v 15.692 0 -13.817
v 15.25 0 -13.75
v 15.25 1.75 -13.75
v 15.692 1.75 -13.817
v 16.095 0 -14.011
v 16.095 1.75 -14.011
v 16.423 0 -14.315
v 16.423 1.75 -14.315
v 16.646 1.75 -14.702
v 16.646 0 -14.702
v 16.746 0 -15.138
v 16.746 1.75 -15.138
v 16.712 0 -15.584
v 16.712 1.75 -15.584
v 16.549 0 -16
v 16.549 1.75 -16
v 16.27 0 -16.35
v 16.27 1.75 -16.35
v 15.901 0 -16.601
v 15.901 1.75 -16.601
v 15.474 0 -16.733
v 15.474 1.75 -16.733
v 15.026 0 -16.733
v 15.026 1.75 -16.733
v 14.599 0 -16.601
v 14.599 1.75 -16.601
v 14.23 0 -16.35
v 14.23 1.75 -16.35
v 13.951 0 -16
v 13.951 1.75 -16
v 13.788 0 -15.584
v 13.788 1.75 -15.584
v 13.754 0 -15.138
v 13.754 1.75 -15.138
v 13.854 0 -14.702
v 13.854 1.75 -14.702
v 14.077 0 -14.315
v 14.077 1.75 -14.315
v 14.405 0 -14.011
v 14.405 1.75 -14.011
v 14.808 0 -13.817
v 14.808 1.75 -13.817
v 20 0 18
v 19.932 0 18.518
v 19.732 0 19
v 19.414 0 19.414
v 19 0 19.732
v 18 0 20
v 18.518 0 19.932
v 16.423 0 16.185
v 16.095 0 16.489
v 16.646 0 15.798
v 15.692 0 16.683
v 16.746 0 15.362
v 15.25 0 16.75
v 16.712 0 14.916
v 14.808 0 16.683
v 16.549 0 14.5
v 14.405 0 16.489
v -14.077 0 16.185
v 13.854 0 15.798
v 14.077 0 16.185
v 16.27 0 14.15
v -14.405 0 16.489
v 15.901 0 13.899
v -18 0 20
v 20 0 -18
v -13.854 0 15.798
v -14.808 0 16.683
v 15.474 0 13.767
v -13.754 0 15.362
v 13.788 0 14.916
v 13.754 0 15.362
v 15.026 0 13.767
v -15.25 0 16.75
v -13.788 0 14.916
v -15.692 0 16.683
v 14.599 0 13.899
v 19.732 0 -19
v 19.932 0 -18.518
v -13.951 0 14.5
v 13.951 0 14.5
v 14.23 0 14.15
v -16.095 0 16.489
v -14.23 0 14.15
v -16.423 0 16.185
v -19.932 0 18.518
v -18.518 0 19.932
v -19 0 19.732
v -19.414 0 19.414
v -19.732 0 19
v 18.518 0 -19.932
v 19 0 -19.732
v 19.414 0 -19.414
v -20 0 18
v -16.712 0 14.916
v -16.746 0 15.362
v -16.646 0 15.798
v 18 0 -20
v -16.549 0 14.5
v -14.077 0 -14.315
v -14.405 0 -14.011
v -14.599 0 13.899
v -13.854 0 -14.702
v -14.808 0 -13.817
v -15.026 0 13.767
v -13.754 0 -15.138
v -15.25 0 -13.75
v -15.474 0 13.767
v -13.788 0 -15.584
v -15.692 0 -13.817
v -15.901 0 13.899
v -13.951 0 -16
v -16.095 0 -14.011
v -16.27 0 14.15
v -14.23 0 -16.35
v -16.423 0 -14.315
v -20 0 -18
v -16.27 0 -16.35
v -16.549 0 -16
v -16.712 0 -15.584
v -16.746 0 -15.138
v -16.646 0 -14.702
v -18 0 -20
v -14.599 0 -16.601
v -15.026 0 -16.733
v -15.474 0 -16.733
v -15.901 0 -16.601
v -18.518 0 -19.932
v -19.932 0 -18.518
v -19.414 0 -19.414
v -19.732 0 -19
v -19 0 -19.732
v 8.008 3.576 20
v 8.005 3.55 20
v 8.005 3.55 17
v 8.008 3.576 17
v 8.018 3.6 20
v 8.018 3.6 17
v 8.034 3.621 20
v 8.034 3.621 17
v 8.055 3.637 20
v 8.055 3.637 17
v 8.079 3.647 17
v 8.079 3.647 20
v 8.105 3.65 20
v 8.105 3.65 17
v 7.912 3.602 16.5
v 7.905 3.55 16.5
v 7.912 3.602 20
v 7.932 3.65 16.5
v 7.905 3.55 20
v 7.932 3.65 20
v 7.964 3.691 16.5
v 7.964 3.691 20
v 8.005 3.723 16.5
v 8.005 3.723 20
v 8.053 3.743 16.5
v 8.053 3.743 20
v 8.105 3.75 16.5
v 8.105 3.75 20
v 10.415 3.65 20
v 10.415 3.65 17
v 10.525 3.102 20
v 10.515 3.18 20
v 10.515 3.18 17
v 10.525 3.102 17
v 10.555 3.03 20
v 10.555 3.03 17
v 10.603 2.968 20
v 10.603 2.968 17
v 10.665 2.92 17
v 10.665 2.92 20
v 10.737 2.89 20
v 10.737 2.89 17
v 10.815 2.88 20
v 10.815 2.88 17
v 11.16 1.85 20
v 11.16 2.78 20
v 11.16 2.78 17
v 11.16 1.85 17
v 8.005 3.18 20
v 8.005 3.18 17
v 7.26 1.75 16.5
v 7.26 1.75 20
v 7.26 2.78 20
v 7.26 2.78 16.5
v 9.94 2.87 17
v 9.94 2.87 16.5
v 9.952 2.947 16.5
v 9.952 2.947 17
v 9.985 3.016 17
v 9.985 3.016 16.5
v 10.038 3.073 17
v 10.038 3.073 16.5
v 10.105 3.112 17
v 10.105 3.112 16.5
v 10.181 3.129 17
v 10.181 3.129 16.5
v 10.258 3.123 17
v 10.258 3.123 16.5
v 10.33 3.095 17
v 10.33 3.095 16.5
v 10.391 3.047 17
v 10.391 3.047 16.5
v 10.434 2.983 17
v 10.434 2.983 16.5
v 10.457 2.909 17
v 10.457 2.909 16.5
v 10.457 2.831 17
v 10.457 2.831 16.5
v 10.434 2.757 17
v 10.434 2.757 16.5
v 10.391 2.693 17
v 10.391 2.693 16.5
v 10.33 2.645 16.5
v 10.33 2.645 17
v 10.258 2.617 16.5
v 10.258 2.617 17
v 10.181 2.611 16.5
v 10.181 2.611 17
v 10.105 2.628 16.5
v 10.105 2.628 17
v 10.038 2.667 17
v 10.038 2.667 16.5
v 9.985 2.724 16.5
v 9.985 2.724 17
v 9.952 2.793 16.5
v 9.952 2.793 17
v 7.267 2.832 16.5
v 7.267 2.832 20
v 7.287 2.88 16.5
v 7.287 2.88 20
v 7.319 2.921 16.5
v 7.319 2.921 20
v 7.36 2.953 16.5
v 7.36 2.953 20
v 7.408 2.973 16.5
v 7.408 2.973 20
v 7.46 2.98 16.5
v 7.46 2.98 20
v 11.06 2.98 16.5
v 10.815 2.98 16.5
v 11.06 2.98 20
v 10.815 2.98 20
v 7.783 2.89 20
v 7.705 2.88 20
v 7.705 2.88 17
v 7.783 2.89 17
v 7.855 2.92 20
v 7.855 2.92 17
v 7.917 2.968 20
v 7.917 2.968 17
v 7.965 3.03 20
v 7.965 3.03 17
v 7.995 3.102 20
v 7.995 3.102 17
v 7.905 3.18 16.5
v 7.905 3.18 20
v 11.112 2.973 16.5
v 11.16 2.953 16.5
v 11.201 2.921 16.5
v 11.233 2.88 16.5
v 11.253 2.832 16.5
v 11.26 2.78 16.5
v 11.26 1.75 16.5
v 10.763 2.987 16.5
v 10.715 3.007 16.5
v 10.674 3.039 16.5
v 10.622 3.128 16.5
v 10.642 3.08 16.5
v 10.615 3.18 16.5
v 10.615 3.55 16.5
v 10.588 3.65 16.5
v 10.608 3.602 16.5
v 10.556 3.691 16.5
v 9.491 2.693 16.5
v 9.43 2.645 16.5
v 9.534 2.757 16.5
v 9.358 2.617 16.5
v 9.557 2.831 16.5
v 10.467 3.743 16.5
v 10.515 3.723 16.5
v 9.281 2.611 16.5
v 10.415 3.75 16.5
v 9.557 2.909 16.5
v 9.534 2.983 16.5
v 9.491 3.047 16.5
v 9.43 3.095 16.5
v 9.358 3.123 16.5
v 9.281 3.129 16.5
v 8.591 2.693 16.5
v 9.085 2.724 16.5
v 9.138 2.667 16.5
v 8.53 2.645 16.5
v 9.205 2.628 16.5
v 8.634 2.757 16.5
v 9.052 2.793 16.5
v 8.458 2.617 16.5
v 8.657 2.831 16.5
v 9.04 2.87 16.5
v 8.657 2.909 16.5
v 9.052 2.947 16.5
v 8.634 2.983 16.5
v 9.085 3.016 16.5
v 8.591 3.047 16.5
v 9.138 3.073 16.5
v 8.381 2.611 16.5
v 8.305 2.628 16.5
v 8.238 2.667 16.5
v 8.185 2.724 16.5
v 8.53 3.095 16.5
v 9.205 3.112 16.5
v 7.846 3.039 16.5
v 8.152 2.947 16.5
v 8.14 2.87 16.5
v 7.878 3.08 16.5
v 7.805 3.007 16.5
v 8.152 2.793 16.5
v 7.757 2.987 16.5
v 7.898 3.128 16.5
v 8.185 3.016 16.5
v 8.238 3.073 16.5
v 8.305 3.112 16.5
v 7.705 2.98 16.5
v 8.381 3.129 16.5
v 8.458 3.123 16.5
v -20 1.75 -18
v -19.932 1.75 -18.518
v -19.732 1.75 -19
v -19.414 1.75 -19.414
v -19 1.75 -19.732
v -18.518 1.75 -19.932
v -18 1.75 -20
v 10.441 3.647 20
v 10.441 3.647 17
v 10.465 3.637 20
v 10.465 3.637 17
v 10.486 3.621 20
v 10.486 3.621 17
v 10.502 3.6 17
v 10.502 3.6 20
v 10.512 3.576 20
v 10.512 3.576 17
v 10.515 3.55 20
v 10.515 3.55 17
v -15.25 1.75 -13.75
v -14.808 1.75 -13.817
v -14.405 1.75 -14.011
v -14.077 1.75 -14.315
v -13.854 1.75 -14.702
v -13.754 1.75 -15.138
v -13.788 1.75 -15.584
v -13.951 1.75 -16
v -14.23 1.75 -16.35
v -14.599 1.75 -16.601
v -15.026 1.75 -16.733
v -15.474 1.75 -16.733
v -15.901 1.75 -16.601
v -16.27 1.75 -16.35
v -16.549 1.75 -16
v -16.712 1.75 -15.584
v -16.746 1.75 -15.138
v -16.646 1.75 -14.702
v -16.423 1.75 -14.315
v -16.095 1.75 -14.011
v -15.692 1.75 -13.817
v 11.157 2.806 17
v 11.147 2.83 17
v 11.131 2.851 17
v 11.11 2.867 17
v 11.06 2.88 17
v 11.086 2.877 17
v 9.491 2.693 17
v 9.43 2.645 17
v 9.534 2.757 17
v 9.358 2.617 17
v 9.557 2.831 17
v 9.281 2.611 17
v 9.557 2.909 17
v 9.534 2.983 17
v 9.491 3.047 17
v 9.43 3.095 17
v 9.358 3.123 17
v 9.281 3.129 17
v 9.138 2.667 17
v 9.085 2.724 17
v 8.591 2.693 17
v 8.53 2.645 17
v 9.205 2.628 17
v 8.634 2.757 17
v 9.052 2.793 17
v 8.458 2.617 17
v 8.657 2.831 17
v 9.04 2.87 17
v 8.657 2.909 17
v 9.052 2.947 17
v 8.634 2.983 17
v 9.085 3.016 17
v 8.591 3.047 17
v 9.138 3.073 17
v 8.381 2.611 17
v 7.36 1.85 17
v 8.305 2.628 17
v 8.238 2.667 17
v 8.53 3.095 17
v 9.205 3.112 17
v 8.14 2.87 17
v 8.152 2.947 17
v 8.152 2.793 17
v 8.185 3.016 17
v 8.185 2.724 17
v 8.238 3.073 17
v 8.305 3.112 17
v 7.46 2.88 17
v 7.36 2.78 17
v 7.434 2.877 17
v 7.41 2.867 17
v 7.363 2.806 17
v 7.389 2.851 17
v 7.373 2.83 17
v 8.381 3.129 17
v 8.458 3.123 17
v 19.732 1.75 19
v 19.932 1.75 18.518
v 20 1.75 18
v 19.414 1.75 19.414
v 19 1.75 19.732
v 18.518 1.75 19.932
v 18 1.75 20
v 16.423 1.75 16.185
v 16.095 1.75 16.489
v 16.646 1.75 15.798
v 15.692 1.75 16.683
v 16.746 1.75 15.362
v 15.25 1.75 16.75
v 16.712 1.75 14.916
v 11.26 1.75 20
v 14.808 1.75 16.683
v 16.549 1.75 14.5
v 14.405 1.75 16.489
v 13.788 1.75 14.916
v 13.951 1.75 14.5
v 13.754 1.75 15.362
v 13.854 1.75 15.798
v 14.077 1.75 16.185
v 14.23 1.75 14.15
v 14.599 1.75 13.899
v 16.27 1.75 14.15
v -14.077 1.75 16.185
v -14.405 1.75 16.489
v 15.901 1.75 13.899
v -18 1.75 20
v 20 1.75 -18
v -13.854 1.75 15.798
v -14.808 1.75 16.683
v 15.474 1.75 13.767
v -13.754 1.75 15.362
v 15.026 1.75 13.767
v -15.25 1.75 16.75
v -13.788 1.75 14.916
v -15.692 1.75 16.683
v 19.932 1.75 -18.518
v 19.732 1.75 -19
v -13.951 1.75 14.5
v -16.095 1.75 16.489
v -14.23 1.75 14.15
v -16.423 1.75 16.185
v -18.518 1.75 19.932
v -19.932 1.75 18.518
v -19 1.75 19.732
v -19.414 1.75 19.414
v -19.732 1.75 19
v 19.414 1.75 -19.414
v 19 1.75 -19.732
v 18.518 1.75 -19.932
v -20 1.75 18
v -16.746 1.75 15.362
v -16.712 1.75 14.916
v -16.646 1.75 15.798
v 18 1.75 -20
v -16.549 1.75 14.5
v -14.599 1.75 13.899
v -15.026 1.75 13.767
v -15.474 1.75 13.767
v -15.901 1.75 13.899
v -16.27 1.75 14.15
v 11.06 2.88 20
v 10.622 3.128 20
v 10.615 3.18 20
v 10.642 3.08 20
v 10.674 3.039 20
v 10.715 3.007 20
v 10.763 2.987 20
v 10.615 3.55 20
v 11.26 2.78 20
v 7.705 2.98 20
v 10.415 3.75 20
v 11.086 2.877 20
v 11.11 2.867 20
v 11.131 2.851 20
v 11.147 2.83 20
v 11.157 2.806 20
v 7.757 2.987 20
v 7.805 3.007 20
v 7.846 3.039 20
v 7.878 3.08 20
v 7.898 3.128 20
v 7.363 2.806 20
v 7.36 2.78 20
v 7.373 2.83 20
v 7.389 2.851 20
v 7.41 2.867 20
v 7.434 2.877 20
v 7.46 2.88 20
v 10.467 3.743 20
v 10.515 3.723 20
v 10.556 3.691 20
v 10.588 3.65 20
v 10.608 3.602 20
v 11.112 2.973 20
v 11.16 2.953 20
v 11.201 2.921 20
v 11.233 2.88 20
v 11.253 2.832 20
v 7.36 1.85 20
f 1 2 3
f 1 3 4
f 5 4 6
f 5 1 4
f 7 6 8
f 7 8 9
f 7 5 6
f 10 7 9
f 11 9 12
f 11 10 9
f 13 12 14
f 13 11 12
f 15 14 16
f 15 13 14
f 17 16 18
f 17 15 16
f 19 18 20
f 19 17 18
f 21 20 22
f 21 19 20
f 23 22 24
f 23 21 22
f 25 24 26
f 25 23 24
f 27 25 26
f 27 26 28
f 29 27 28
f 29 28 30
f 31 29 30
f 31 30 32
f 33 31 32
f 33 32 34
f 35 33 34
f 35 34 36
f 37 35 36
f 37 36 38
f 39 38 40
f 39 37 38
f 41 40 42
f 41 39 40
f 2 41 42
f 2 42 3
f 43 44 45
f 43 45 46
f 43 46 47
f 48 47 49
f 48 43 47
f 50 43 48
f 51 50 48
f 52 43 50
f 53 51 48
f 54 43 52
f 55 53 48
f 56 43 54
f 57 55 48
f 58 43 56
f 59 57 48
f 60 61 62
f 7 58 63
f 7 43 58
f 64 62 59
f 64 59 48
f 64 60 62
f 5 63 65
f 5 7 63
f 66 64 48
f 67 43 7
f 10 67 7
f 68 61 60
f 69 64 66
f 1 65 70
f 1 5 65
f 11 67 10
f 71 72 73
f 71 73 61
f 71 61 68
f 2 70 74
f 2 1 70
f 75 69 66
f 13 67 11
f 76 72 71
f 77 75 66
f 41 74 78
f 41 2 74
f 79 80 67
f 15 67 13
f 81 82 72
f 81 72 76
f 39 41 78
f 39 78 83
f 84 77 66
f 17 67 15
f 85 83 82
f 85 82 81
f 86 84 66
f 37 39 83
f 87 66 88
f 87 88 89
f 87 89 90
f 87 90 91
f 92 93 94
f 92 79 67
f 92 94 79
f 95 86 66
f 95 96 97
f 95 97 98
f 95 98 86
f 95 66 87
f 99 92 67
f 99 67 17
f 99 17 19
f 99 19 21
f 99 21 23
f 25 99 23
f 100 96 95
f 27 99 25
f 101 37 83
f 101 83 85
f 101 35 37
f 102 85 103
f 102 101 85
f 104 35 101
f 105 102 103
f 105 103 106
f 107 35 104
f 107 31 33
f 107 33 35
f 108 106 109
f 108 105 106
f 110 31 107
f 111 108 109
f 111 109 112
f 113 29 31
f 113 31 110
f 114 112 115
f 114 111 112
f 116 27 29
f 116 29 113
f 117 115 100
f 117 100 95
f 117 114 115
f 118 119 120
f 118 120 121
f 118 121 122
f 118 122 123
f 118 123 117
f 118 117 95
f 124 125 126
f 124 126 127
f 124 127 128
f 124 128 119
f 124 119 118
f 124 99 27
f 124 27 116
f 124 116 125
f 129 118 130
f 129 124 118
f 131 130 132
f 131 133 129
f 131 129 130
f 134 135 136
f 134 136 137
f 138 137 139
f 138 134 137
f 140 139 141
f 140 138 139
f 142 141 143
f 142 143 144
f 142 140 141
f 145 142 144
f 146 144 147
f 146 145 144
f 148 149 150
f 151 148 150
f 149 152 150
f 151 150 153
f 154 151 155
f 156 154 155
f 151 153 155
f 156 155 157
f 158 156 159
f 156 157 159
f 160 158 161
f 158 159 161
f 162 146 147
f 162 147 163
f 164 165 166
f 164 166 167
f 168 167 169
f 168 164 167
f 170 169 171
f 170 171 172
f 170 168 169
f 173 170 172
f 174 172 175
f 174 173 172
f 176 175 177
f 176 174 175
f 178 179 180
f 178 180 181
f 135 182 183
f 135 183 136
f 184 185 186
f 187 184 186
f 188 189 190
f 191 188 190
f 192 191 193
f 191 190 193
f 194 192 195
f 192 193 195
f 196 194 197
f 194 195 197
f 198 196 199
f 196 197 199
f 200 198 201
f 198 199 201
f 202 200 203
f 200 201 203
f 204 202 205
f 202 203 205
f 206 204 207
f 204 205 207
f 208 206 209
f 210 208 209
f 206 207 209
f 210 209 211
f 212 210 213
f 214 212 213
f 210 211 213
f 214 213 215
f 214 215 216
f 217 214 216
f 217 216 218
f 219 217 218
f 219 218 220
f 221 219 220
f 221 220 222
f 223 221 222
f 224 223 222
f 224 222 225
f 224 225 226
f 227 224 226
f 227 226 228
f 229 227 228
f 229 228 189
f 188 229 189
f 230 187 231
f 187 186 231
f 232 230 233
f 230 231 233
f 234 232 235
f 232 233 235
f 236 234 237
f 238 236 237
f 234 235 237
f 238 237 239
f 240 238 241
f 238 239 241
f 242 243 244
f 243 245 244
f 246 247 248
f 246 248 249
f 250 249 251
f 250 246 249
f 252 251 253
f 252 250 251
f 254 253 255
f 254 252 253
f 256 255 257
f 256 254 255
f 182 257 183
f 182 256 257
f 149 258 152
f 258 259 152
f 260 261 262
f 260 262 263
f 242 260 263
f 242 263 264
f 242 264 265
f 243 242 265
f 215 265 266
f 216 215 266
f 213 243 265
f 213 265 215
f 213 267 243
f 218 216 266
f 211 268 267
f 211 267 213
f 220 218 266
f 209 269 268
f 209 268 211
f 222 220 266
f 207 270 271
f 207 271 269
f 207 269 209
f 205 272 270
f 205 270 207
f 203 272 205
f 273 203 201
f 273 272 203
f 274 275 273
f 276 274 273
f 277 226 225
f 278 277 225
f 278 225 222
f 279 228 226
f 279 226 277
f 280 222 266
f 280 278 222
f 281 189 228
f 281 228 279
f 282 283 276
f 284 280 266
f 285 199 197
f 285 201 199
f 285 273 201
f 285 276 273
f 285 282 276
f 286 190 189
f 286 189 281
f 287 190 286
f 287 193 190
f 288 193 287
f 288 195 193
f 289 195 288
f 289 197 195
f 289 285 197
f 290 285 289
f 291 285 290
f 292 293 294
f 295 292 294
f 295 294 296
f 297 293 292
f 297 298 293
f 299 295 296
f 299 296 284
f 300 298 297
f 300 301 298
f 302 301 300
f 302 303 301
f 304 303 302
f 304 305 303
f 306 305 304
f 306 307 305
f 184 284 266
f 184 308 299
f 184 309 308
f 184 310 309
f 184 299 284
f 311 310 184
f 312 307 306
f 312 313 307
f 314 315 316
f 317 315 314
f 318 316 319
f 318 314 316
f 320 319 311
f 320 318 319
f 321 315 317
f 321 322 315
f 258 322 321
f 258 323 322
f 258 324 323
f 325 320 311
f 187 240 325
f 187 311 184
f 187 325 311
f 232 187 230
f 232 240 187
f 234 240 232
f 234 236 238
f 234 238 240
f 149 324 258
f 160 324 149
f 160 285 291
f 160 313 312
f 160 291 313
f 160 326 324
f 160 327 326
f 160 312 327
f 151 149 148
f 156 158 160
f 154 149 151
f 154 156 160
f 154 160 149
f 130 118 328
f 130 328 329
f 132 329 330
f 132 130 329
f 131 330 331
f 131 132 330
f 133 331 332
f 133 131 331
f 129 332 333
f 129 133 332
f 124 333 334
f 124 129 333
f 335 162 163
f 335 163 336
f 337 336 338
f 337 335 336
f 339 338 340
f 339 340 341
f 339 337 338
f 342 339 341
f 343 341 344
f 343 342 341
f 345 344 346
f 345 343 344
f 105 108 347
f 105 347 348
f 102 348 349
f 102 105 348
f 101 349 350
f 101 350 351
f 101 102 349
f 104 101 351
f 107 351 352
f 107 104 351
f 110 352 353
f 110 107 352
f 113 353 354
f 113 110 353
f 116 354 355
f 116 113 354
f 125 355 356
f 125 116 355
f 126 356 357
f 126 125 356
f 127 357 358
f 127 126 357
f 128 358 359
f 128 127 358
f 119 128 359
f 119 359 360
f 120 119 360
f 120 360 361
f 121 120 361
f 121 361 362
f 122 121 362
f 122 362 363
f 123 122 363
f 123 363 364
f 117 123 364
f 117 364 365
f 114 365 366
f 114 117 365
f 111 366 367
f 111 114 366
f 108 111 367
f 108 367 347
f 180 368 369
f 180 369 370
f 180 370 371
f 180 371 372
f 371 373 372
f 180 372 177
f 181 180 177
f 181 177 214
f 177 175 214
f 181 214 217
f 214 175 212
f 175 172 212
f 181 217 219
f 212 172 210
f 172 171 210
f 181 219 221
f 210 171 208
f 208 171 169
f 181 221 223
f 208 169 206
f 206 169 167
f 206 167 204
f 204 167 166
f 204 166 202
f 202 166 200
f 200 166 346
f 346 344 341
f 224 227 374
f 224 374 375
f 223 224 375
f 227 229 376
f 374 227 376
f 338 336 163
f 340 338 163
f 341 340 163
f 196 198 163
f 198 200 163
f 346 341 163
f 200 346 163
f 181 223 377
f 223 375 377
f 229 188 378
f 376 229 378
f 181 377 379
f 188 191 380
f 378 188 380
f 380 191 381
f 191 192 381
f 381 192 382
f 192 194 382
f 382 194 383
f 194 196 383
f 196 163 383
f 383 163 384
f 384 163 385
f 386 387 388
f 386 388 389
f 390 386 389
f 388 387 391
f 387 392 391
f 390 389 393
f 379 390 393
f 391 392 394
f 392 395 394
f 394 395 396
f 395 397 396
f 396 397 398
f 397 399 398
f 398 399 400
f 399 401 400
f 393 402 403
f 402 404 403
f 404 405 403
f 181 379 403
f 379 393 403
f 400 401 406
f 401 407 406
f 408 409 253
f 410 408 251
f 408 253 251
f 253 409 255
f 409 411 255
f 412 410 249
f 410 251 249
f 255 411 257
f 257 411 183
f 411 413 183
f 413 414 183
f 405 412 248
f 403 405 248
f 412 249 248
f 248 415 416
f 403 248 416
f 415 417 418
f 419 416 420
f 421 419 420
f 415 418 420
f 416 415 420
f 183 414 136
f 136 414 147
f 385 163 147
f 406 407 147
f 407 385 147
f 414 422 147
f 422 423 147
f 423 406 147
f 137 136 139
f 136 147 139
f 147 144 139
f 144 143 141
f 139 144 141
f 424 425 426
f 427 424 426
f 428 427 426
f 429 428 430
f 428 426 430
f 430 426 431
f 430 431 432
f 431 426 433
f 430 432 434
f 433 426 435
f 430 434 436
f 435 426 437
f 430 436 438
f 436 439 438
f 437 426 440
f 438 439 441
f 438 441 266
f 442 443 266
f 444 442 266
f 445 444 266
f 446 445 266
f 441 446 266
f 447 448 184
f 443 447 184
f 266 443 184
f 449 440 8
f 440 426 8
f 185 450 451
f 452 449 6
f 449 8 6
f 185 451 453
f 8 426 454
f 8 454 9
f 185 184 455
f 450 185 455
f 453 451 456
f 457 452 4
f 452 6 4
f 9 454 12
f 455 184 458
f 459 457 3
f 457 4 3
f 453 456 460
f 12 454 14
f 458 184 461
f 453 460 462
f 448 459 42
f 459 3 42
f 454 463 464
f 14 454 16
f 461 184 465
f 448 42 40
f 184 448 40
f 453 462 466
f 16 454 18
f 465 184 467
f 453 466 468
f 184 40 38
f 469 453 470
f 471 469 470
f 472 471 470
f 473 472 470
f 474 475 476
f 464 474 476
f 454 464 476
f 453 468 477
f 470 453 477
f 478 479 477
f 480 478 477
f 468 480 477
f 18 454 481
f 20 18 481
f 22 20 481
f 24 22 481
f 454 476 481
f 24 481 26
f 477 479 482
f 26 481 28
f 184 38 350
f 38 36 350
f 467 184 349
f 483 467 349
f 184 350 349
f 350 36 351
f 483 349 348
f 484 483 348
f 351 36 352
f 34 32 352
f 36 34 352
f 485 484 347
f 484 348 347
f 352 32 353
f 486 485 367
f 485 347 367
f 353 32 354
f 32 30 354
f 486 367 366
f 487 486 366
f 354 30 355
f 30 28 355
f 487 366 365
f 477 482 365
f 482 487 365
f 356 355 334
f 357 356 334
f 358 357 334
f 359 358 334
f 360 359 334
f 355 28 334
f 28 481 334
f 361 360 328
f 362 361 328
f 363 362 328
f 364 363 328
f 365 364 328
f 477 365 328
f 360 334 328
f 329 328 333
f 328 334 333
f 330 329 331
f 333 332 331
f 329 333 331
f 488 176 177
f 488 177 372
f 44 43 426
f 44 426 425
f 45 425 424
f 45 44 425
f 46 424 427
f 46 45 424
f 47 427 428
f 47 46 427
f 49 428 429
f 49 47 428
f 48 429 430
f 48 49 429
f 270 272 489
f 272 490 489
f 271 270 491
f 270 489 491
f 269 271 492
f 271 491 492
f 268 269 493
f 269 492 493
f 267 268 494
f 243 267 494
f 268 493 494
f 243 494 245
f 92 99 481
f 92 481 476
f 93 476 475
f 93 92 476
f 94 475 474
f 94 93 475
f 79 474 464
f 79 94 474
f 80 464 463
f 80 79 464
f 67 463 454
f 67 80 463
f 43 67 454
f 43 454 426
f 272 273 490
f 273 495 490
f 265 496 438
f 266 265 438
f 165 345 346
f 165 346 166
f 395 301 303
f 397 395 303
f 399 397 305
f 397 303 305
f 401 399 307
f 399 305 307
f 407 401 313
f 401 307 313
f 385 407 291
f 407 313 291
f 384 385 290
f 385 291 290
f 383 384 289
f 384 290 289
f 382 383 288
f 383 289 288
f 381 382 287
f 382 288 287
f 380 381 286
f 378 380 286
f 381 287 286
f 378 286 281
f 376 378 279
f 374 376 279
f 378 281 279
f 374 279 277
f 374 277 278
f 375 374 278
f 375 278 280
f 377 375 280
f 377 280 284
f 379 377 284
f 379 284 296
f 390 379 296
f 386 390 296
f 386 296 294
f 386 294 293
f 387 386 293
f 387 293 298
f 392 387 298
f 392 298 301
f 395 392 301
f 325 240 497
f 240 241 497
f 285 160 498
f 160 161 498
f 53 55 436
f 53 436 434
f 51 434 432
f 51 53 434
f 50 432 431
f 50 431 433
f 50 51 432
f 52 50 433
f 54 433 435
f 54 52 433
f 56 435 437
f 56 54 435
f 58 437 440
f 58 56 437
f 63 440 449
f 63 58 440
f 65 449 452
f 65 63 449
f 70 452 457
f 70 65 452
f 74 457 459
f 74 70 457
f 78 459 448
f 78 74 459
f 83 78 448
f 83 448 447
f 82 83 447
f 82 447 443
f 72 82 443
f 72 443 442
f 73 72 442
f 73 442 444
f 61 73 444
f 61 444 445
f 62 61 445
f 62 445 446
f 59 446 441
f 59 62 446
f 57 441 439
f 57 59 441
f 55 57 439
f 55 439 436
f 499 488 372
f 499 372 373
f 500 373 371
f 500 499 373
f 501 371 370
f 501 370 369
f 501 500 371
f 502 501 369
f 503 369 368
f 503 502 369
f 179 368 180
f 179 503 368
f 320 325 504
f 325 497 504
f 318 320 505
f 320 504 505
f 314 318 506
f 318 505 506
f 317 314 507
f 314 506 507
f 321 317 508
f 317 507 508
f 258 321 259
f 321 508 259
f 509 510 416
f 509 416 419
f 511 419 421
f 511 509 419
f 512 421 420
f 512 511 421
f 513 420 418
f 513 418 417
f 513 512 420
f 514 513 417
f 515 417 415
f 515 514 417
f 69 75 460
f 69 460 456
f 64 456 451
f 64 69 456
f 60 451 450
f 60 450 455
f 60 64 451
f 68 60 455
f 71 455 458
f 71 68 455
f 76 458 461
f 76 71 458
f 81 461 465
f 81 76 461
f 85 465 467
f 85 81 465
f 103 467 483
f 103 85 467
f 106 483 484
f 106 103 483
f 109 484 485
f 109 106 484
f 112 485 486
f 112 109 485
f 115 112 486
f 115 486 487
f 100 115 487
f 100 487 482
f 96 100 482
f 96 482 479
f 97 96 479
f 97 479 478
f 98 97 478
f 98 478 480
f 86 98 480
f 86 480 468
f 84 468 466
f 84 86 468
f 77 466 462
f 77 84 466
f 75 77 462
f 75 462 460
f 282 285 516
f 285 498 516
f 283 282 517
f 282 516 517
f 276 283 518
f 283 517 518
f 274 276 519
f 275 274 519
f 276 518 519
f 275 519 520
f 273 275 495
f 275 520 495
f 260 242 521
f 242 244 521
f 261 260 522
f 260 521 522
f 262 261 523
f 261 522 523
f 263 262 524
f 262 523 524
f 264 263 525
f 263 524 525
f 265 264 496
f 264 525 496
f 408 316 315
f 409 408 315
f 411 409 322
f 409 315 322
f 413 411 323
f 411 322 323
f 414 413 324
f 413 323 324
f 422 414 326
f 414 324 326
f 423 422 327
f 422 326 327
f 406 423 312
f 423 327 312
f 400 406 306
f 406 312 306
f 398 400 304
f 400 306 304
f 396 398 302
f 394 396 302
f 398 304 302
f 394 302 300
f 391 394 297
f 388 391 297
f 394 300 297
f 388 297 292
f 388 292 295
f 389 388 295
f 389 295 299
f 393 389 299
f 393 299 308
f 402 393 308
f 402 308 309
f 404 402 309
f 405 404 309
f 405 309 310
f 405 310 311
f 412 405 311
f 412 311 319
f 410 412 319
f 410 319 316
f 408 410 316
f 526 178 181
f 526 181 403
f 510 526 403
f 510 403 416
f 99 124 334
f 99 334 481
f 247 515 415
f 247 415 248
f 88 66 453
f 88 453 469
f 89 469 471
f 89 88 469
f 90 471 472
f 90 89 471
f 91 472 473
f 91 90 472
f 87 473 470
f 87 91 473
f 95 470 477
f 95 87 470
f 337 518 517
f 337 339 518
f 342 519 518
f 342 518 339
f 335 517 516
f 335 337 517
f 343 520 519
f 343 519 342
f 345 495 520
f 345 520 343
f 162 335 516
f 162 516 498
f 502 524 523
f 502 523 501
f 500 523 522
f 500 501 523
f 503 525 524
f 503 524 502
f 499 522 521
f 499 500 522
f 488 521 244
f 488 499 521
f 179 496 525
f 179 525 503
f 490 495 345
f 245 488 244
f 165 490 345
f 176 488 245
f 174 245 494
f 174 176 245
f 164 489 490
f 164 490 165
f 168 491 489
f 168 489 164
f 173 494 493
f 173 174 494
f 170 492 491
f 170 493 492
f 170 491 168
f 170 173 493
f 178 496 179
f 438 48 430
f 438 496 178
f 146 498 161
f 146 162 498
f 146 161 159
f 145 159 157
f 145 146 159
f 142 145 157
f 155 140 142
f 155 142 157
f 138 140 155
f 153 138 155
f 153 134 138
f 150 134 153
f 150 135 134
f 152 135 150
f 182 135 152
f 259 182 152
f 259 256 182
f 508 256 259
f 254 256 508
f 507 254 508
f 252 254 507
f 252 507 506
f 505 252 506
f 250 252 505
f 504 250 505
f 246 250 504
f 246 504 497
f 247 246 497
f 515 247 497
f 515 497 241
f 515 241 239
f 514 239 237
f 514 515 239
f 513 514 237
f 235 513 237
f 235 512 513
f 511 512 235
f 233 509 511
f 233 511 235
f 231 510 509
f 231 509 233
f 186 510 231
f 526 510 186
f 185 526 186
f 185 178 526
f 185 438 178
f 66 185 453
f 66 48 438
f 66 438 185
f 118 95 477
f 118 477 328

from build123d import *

# Parameters (mm, degrees)
SKETCH1_R           = 1.5
BOSS_EXTRUDE1_DEPTH = 1.75
BOSS_EXTRUDE2_DEPTH = 3
BOSS_EXTRUDE3_DEPTH = 0.5
SKETCH4_R           = 0.26
CUT_EXTRUDE1_DEPTH  = 42.78890403


with BuildPart() as part:
    # Sketch1 → Boss-Extrude1 (new body)
    with BuildSketch(Plane(origin=(0, 0, 0), x_dir=(1, 0, 0), z_dir=(0, 1, 0))):
        with BuildLine():
            Line((-18, 20), (18, 20))
            ThreePointArc((18, 20), (19.414213562, 19.414213562), (20, 18))
            Line((20, 18), (20, -18))
            ThreePointArc((20, -18), (19.414213562, -19.414213562), (18, -20))
            Line((18, -20), (-18, -20))
            ThreePointArc((-18, -20), (-19.414213562, -19.414213562), (-20, -18))
            Line((-20, -18), (-20, 18))
            ThreePointArc((-20, 18), (-19.414213562, 19.414213562), (-18, 20))
        make_face()
        with Locations(Location((-15.25, 15.25, 0), (0, 0, 270))):
            Circle(SKETCH1_R, mode=Mode.SUBTRACT)
        with Locations(Location((15.25, 15.25, 0), (0, 0, 270))):
            Circle(SKETCH1_R, mode=Mode.SUBTRACT)
        with Locations(Location((15.25, -15.25, 0), (0, 0, 270))):
            Circle(SKETCH1_R, mode=Mode.SUBTRACT)
        with Locations(Location((-15.25, -15.25, 0), (0, 0, 270))):
            Circle(SKETCH1_R, mode=Mode.SUBTRACT)
    extrude(amount=BOSS_EXTRUDE1_DEPTH)

    # Sketch2 → Boss-Extrude2 (add)
    with BuildSketch(Plane.XY.offset(20)):
        with BuildLine():
            Line((7.26, 1.75), (7.26, 2.78))
            ThreePointArc((7.26, 2.78), (7.318578644, 2.921421356), (7.46, 2.98))
            Line((7.46, 2.98), (7.705, 2.98))
            ThreePointArc((7.705, 2.98), (7.846421356, 3.038578644), (7.905, 3.18))
            Line((7.905, 3.18), (7.905, 3.55))
            ThreePointArc((7.905, 3.55), (7.963578644, 3.691421356), (8.105, 3.75))
            Line((8.105, 3.75), (10.415, 3.75))
            ThreePointArc((10.415, 3.75), (10.556421356, 3.691421356), (10.615, 3.55))
            Line((10.615, 3.55), (10.615, 3.18))
            ThreePointArc((10.615, 3.18), (10.673578644, 3.038578644), (10.815, 2.98))
            Line((10.815, 2.98), (11.06, 2.98))
            ThreePointArc((11.06, 2.98), (11.201421356, 2.921421356), (11.26, 2.78))
            Line((11.26, 2.78), (11.26, 1.75))
            Line((11.26, 1.75), (7.26, 1.75))
        make_face()
        with BuildLine():
            Line((7.36, 1.85), (7.36, 2.78))
            ThreePointArc((7.36, 2.78), (7.389289322, 2.850710678), (7.46, 2.88))
            Line((7.46, 2.88), (7.705, 2.88))
            ThreePointArc((7.705, 2.88), (7.917132034, 2.967867966), (8.005, 3.18))
            Line((8.005, 3.18), (8.005, 3.55))
            ThreePointArc((8.005, 3.55), (8.034289322, 3.620710678), (8.105, 3.65))
            Line((8.105, 3.65), (10.415, 3.65))
            ThreePointArc((10.415, 3.65), (10.485710678, 3.620710678), (10.515, 3.55))
            Line((10.515, 3.55), (10.515, 3.18))
            ThreePointArc((10.515, 3.18), (10.602867966, 2.967867966), (10.815, 2.88))
            Line((10.815, 2.88), (11.06, 2.88))
            ThreePointArc((11.06, 2.88), (11.130710678, 2.850710678), (11.16, 2.78))
            Line((11.16, 2.78), (11.16, 1.85))
            Line((11.16, 1.85), (7.36, 1.85))
        make_face(mode=Mode.SUBTRACT)
    extrude(amount=-BOSS_EXTRUDE2_DEPTH)

    # Sketch3 → Boss-Extrude3 (add)
    with BuildSketch(Plane(origin=(0, 0, 17), x_dir=(-1, 0, 0), z_dir=(0, 0, -1))):
        with BuildLine():
            Line((-11.26, 1.75), (-7.26, 1.75))
            Line((-7.26, 1.75), (-7.26, 2.78))
            ThreePointArc((-7.26, 2.78), (-7.318578644, 2.921421356), (-7.46, 2.98))
            Line((-7.46, 2.98), (-7.705, 2.98))
            ThreePointArc((-7.705, 2.98), (-7.846421356, 3.038578644), (-7.905, 3.18))
            Line((-7.905, 3.18), (-7.905, 3.55))
            ThreePointArc((-7.905, 3.55), (-7.963578644, 3.691421356), (-8.105, 3.75))
            Line((-8.105, 3.75), (-10.415, 3.75))
            ThreePointArc((-10.415, 3.75), (-10.556421356, 3.691421356), (-10.615, 3.55))
            Line((-10.615, 3.55), (-10.615, 3.18))
            ThreePointArc((-10.615, 3.18), (-10.673578644, 3.038578644), (-10.815, 2.98))
            Line((-10.815, 2.98), (-11.06, 2.98))
            ThreePointArc((-11.06, 2.98), (-11.201421356, 2.921421356), (-11.26, 2.78))
            Line((-11.26, 2.78), (-11.26, 1.75))
        make_face()
    extrude(amount=BOSS_EXTRUDE3_DEPTH)

    # Sketch4 → Cut-Extrude1 (cut, through all)
    with BuildSketch(Plane(origin=(0, 0, 16.5), x_dir=(-1, 0, 0), z_dir=(0, 0, -1))):
        with Locations((-10.2, 2.87)):
            Circle(SKETCH4_R)
        with Locations((-9.3, 2.87)):
            Circle(SKETCH4_R)
        with Locations((-8.4, 2.87)):
            Circle(SKETCH4_R)
    extrude(amount=-CUT_EXTRUDE1_DEPTH, mode=Mode.SUBTRACT)


solid = part.part
